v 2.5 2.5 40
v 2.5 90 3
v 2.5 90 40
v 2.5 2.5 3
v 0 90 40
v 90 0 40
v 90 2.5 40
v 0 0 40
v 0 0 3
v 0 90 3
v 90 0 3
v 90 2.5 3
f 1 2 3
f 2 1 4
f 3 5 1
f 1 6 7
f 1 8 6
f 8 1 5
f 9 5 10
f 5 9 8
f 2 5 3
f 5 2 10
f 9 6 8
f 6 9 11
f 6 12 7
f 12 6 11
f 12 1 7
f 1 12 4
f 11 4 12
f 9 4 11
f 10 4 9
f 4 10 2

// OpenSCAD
// Fan box - a top plate and four walls, open at the top, to house a PC case fan as a
// magnetic stirrer. NOVEL general part.
//

top     = 90;
length  = 90;
height  = 40;
wall    = 2.5;
screw   = 4.5;
cable   = 12;

$fn = 48;

plate_t = 2;

difference() {
    union() {
        cube([top, length, plate_t]);                                              // top plate
        for (x = [-top / 2 - wall / 2, top / 2 + wall / 2])
            cube([wall, length, height], p = [x, 0, 0]);                           // left/right walls
        for (y = [-length / 2 - wall / 2, length / 2 + wall / 2])
            cube([top, wall, height], p = [0, y, 0]);                              // front/back walls
    }
    translate([0, 0, -1]) cube([top, length, plate_t + 2]);                        // pocket the fan through the plate
    for (x = [-71.5 / 2 / 2, 71.5 / 2 / 2], y = [-71.5 / 2 / 2, 71.5 / 2 / 2])
        translate([x, y, -1]) cylinder(h = plate_t + 2, d = screw);                 // screw holes
    // cable notch in the +y wall (right wall), centre-d in Y, 8 mm up from the open edge
    translate([top / 2 - cable / 2, length / 2, height - 8]) cube([cable, wall + 1, 8]);
}
